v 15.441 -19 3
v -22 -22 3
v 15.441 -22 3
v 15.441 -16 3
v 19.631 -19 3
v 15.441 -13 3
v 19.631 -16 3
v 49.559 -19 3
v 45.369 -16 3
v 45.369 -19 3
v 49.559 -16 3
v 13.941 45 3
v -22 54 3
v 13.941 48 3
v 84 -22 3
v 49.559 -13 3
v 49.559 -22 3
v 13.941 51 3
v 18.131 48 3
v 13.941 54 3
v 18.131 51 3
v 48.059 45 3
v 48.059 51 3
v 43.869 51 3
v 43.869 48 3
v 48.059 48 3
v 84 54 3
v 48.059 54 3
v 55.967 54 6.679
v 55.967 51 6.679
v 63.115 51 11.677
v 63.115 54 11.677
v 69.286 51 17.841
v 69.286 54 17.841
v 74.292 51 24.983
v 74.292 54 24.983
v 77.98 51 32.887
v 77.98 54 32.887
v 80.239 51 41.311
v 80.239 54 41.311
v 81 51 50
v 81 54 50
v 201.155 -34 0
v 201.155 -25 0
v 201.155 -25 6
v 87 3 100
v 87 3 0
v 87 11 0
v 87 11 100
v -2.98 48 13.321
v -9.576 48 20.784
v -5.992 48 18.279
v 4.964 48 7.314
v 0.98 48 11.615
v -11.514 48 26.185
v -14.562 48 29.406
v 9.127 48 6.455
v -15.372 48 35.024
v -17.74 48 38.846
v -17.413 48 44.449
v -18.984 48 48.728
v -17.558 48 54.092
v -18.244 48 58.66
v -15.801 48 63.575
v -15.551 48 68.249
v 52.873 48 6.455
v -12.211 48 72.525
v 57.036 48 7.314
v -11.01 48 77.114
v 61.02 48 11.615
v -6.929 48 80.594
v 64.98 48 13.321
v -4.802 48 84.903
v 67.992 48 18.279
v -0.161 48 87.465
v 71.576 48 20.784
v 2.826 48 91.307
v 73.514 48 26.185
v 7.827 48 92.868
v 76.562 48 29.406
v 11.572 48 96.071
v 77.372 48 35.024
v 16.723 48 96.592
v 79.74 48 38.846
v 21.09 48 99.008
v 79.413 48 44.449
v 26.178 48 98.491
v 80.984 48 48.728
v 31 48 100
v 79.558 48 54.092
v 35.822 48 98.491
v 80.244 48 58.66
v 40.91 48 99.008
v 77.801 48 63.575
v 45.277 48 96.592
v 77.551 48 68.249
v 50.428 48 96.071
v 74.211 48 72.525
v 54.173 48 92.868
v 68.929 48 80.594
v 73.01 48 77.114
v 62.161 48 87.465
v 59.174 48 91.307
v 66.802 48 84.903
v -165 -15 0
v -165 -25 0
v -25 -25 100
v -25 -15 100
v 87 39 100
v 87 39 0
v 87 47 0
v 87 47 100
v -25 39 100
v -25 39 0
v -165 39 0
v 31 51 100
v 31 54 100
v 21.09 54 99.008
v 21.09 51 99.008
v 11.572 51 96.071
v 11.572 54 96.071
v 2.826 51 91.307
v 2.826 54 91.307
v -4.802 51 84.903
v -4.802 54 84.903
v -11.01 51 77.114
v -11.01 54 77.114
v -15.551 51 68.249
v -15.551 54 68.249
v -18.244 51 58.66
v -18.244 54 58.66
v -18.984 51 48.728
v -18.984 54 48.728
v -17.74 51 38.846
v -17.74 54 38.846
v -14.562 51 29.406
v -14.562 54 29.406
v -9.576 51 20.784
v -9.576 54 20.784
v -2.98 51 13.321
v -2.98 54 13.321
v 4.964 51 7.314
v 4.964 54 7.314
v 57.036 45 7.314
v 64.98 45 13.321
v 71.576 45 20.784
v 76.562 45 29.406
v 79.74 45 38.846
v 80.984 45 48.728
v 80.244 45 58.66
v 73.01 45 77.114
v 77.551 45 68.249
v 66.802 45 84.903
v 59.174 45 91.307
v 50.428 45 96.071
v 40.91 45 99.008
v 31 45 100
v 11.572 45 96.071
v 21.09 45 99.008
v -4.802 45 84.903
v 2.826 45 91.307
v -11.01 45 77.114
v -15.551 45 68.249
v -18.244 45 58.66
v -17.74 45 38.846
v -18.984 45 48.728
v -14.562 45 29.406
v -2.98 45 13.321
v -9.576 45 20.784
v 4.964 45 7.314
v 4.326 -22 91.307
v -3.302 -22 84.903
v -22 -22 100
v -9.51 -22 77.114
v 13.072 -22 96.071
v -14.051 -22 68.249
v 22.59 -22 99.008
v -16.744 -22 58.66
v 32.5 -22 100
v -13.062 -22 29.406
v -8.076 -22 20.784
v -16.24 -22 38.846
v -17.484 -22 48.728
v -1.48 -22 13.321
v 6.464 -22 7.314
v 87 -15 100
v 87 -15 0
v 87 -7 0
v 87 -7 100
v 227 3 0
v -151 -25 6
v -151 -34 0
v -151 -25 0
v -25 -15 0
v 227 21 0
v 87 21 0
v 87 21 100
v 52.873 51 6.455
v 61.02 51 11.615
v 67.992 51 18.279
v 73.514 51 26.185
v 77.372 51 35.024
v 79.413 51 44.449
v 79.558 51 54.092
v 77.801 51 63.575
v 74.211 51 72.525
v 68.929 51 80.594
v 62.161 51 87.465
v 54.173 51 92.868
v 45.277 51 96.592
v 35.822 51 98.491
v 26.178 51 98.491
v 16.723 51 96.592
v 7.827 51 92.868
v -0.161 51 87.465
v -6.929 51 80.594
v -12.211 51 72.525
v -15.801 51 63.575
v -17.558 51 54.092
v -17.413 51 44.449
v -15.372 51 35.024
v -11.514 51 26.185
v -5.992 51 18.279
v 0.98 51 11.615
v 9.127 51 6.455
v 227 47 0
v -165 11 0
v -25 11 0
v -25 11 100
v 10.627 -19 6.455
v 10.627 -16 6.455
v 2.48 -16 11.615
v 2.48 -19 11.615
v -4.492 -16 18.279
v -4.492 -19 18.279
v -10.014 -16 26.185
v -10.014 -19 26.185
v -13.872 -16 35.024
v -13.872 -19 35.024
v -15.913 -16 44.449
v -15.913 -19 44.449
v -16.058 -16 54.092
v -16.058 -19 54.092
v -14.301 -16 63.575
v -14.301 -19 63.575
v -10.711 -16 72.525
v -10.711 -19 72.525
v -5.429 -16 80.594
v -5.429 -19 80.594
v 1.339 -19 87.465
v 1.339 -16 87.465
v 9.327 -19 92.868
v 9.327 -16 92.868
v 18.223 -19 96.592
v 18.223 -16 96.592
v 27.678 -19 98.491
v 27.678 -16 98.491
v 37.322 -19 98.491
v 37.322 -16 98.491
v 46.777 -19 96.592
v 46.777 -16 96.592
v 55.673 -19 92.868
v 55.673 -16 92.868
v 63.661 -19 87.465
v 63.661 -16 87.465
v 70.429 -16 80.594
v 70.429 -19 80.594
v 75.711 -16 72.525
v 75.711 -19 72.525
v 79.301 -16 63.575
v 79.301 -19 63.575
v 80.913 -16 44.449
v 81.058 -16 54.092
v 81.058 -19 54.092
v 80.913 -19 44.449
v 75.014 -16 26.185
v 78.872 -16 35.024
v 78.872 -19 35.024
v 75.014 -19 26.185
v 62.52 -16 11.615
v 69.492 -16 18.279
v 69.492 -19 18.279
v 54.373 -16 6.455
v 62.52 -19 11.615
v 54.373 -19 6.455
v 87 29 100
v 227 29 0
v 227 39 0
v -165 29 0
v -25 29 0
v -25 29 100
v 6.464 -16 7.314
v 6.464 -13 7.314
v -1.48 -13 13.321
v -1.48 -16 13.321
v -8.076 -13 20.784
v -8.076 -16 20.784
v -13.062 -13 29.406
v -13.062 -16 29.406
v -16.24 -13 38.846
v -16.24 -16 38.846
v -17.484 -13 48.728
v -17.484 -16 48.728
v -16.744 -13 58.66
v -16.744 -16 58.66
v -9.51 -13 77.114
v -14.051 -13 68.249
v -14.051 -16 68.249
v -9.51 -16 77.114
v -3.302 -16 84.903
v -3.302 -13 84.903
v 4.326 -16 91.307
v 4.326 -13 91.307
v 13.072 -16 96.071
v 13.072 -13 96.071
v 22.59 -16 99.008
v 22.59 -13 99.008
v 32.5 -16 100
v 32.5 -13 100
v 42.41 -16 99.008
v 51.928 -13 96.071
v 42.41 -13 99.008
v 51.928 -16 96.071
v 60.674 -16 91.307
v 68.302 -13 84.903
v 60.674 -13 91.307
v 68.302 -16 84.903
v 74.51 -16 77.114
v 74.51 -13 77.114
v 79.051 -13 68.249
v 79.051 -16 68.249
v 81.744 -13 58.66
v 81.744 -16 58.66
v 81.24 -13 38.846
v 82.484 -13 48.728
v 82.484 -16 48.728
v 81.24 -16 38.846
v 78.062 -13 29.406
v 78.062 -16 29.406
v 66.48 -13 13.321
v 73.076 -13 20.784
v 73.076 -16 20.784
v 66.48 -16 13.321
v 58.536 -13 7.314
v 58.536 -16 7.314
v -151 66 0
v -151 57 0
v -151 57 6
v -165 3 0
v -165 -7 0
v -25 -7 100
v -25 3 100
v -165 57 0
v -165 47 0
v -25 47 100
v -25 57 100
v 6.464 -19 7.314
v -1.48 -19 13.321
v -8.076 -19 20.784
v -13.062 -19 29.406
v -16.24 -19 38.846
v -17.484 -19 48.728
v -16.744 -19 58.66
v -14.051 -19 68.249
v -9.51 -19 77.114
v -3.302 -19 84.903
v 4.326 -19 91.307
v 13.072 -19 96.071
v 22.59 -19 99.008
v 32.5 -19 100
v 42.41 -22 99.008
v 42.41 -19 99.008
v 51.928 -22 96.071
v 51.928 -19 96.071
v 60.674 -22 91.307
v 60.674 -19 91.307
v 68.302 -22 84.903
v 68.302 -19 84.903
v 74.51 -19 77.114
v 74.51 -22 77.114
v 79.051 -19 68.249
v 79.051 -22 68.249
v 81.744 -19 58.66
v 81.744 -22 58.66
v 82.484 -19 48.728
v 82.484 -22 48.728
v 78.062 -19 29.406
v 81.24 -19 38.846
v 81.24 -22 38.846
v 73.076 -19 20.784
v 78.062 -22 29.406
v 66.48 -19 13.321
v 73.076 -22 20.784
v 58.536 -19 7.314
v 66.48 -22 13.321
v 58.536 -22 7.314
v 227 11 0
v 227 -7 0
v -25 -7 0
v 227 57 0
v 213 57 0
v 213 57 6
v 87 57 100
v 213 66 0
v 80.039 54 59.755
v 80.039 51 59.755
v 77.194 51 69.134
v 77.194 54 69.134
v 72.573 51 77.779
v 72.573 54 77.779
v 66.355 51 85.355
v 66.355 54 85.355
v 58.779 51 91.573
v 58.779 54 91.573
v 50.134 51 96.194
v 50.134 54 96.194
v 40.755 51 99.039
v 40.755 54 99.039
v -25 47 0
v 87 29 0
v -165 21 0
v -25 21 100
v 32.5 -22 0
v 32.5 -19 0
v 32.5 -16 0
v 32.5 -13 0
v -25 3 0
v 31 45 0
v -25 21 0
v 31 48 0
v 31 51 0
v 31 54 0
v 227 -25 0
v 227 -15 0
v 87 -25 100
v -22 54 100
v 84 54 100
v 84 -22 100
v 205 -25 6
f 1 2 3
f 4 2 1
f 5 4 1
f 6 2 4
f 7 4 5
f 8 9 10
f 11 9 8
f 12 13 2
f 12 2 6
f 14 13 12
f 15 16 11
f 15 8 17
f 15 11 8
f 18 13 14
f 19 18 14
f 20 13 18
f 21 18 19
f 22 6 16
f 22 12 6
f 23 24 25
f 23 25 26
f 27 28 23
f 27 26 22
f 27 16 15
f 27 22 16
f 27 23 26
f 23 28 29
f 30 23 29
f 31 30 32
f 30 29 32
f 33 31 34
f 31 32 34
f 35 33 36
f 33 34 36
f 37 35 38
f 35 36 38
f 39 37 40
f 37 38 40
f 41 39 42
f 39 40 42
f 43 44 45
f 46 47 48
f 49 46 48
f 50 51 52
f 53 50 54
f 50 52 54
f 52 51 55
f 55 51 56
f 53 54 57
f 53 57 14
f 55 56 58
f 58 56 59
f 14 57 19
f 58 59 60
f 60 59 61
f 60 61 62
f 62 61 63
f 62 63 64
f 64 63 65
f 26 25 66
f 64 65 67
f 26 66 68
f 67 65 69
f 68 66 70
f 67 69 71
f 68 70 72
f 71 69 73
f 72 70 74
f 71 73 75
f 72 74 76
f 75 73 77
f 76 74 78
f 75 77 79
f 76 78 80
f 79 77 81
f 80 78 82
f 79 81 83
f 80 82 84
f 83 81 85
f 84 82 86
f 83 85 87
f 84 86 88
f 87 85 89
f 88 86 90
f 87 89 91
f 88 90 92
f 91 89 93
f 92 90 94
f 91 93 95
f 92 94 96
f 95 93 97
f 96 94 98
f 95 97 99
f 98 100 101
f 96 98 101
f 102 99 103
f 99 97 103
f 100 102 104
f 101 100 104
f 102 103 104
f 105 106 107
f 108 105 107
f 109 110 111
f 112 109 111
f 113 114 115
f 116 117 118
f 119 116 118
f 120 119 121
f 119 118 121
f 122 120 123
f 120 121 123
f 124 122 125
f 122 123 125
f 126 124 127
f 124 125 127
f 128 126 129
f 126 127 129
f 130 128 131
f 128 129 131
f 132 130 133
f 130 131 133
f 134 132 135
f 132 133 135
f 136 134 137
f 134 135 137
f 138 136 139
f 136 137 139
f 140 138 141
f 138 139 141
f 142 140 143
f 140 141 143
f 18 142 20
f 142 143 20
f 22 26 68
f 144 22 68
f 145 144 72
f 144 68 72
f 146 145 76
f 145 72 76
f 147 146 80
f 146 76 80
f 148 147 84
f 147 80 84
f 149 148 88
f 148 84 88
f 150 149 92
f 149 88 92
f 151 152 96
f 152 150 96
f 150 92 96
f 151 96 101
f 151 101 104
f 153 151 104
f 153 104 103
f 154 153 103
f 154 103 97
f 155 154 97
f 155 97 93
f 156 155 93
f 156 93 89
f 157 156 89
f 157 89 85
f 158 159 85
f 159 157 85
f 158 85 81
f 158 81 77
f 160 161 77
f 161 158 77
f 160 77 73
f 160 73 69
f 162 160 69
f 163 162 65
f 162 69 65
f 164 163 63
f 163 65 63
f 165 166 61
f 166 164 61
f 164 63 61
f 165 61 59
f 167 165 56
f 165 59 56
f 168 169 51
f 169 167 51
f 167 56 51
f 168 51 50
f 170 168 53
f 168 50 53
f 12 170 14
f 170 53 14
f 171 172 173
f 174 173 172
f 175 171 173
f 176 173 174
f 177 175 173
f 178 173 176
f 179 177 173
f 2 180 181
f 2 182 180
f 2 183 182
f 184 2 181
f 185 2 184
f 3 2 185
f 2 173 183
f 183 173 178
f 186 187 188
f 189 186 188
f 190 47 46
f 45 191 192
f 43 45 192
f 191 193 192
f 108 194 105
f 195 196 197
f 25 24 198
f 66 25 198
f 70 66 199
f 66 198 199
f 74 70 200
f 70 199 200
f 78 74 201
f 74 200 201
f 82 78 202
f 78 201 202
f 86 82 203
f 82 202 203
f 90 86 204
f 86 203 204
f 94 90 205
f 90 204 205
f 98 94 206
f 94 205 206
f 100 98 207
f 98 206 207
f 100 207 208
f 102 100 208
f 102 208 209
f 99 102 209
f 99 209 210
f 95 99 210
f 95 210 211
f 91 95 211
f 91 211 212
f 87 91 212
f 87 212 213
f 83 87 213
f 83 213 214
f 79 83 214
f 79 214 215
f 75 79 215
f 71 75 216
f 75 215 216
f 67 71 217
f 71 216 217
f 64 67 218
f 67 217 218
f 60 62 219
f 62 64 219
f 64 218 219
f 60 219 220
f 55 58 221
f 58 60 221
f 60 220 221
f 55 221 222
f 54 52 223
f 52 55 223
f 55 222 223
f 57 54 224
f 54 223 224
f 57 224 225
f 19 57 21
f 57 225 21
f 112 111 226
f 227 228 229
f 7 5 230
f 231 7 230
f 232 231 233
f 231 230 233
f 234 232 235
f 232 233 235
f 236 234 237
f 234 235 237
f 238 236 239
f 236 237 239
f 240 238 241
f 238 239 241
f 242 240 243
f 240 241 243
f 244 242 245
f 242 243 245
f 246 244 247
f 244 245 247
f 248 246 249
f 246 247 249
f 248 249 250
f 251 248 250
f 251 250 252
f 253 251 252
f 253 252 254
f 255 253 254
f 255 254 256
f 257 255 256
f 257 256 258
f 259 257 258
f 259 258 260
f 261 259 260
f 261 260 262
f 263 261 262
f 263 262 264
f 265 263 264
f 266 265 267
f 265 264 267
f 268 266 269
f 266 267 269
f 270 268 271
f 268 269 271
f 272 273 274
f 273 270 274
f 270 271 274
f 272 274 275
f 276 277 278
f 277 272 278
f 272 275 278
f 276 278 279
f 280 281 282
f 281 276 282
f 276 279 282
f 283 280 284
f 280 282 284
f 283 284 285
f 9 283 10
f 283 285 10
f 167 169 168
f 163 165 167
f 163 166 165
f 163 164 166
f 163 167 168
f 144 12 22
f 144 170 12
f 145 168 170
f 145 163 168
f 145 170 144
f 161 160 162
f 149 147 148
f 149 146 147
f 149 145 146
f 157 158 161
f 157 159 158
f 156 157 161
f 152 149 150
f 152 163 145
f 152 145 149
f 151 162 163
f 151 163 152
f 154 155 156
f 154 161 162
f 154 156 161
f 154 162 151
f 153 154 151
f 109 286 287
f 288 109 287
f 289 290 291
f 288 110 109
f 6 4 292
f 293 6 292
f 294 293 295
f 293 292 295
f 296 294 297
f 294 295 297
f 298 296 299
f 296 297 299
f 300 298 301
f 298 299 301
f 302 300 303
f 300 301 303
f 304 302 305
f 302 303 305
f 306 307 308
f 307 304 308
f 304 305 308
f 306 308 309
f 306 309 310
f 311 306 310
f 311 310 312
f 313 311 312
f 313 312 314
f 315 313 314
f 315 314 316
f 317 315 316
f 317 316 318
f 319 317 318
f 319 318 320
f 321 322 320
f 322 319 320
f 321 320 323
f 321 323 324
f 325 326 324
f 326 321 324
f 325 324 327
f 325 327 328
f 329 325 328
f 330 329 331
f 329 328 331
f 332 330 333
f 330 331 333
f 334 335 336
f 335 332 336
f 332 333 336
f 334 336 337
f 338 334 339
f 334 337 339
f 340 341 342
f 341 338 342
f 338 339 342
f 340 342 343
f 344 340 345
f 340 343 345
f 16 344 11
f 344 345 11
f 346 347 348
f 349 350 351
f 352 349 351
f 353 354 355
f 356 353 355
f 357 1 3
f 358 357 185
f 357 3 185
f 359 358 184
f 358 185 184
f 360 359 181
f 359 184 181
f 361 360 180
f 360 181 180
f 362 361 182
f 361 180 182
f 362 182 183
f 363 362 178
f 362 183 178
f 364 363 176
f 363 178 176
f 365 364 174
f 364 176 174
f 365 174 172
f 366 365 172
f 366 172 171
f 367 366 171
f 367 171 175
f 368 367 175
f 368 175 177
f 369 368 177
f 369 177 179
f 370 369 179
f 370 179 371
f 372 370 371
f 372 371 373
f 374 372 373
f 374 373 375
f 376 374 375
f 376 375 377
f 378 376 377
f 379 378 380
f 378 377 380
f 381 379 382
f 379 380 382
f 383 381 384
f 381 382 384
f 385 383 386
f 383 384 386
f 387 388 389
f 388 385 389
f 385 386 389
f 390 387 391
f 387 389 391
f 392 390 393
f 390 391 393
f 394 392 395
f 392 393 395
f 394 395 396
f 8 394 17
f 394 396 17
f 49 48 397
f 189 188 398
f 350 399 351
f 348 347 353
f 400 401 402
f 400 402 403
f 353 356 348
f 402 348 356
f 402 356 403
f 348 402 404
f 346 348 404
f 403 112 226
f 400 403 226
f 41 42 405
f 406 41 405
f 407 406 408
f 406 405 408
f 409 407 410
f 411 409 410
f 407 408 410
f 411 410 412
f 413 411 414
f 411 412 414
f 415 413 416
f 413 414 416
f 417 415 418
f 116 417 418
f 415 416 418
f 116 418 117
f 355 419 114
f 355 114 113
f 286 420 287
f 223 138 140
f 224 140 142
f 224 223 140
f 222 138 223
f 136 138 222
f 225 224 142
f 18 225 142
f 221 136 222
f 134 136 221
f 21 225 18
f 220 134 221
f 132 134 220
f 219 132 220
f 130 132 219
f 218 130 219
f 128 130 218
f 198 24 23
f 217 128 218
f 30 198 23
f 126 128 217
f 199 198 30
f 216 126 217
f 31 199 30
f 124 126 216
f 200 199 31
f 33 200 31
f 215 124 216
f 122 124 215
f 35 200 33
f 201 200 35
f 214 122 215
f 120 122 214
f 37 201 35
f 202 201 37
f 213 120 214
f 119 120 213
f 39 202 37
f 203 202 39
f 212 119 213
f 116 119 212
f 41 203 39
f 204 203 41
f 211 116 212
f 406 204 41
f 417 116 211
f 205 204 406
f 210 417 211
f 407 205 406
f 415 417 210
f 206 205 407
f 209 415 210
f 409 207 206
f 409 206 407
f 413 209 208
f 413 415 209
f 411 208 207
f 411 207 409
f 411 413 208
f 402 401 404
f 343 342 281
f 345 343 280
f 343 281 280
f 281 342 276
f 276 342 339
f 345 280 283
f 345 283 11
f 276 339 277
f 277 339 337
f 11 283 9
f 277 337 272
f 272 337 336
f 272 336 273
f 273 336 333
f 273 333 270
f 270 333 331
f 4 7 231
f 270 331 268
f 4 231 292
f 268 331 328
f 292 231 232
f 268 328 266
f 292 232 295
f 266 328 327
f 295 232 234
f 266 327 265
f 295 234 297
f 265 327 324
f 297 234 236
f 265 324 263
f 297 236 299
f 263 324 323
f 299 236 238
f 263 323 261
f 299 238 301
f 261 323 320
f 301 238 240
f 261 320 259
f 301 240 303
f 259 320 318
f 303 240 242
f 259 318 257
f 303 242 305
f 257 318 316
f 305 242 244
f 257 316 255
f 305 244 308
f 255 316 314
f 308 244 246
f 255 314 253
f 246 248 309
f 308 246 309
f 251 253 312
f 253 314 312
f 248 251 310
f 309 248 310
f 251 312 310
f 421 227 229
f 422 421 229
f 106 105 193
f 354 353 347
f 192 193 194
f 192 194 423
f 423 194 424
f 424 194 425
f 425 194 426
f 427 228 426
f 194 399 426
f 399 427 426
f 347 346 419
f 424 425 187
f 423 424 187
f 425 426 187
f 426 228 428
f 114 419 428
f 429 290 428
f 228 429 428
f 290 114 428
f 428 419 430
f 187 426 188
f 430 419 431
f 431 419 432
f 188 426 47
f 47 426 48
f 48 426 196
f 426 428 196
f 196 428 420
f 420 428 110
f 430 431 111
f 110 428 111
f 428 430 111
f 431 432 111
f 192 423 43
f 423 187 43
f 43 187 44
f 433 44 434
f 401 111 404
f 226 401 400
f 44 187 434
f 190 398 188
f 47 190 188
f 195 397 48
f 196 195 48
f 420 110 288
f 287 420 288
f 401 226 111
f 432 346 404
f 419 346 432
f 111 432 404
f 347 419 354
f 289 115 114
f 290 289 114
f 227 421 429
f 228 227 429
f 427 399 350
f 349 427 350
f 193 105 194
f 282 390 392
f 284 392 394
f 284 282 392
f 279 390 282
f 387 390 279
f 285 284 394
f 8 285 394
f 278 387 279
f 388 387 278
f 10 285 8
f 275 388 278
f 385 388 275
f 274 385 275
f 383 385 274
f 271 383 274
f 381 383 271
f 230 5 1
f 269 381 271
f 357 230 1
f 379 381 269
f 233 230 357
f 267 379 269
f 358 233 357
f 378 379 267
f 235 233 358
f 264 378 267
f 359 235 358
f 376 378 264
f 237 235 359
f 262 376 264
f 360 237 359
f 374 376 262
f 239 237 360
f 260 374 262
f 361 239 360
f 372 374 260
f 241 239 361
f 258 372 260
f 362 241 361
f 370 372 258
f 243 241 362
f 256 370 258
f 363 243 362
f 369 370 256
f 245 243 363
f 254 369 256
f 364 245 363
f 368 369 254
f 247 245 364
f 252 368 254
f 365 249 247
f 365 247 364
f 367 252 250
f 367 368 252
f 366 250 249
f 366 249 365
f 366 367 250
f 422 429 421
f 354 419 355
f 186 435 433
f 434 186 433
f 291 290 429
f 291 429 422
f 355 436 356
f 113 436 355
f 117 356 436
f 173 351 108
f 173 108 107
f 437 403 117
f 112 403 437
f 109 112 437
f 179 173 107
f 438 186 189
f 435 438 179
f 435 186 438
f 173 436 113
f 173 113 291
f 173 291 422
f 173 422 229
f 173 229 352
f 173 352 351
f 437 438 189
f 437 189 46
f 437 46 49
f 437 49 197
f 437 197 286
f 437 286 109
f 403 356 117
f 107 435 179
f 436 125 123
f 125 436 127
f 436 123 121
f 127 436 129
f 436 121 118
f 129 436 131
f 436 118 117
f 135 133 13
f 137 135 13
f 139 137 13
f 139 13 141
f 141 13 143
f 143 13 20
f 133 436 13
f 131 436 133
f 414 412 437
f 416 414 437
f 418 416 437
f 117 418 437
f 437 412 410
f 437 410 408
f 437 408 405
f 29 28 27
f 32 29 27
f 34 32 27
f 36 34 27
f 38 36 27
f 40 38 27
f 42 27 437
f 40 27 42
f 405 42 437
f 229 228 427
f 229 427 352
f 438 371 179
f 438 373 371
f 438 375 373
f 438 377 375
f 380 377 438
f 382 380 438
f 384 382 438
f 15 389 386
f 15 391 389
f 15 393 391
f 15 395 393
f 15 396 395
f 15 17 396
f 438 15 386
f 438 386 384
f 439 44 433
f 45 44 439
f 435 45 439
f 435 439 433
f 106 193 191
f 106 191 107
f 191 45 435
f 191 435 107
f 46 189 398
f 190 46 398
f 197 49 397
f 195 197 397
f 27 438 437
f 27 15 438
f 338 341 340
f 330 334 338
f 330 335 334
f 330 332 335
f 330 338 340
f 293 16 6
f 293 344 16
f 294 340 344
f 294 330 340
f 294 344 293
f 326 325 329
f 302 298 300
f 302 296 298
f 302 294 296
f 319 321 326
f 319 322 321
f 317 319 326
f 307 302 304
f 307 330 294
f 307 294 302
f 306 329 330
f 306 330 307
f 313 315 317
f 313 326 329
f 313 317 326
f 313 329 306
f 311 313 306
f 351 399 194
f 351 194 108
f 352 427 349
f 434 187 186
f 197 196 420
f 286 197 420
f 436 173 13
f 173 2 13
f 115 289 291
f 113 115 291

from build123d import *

# Parameters (mm, degrees)
F0_W      = 112
F0_H      = 82
F1_DEPTH  = 100
F2_T      = -3
F3_W      = 10
F3_H      = 100
F4_DEPTH  = 140
F6_DEPTH  = 100
F7_W      = 226.154828
F7_H      = 6
F8_DEPTH  = 9
F11_DEPTH = 3
F12_R     = 48.73
F13_DEPTH = 3
F14_R     = 50
F15_DEPTH = 3
F16_W     = 10
F16_H     = 100
F17_DEPTH = 140
F19_DEPTH = 82
F21_DEPTH = 3
F22_R     = 48.73
F23_DEPTH = 3
F24_R     = 50
F25_DEPTH = 3
F26_W     = 126
F26_H     = 6
F27_DEPTH = 9
F29_W     = 364
F29_H     = 6
F30_DEPTH = 9
F32_DEPTH = 372
F33_DEPTH = 356


with BuildPart() as f1:
    # F0 (on Top) → F1 (new body)
    with BuildSketch(Plane.XY):
        with Locations((31, 16)):
            Rectangle(F0_W, F0_H)
    extrude(amount=F1_DEPTH)

    # F2
    f2_openings = [f1.faces().sort_by_distance(p)[0] for p in [
        (31, 16, 100),
    ]]
    offset(amount=F2_T, openings=f2_openings)

    # F3 (on face) → F4 (join)
    with BuildSketch(Plane.YZ.offset(87)):
        with Locations((-20, 50)):
            Rectangle(F3_W, F3_H)
        with Locations((52, 50)):
            Rectangle(F3_W, F3_H)
        with Locations((34, 50)):
            Rectangle(F3_W, F3_H)
        with Locations((16, 50)):
            Rectangle(F3_W, F3_H)
        with Locations((-2, 50)):
            Rectangle(F3_W, F3_H)
    extrude(amount=F4_DEPTH)

    # F5 (on face) → F6 (cut)
    with BuildSketch(Plane.XZ.offset(25)):
        Polygon((227, 0), (227, 100), (87, 100), align=None)
    extrude(amount=-F6_DEPTH, mode=Mode.SUBTRACT)

    # F7 (on face) → F8 (join)
    with BuildSketch(Plane.XZ.offset(25)):
        with Locations((88.077414, 3)):
            Rectangle(F7_W, F7_H)
    extrude(amount=F8_DEPTH)

    # F10 (on face) → F11 (join)
    with BuildSketch(Plane.XZ.offset(-54)):
        with BuildLine():
            ThreePointArc((81, 50), (66.355339, 85.355339), (31, 100))
            Line((31, 100), (31, 0))
            ThreePointArc((31, 0), (66.355339, 14.644661), (81, 50))
        make_face()
        with BuildLine():
            Line((31, 0), (31, 100))
            ThreePointArc((31, 100), (-19, 50), (31, 0))
        make_face()
    extrude(amount=F11_DEPTH)

    # F12 (on face) → F13 (join)
    with BuildSketch(Plane.XZ.offset(-51)):
        with Locations((31, 50)):
            Circle(F12_R)
    extrude(amount=F13_DEPTH)

    # F14 (on face) → F15 (join)
    with BuildSketch(Plane.XZ.offset(-48)):
        with Locations((31, 50)):
            Circle(F14_R)
    extrude(amount=F15_DEPTH)

    # F16 (on face) → F17 (join)
    with BuildSketch(Plane(origin=(-25, 0, 0), x_dir=(0, -1, 0), z_dir=(-1, 0, 0))):
        with Locations((-52, 50)):
            Rectangle(F16_W, F16_H)
        with Locations((-34, 50)):
            Rectangle(F16_W, F16_H)
        with Locations((-16, 50)):
            Rectangle(F16_W, F16_H)
        with Locations((2, 50)):
            Rectangle(F16_W, F16_H)
        with Locations((20, 50)):
            Rectangle(F16_W, F16_H)
    extrude(amount=F17_DEPTH)

    # F18 (on face) → F19 (cut)
    with BuildSketch(Plane.XZ.offset(25)):
        Polygon((-165, 100), (-165, 0), (-25, 100), align=None)
    extrude(amount=-F19_DEPTH, mode=Mode.SUBTRACT)

    # F20 (on face) → F21 (join)
    with BuildSketch(Plane(origin=(0, -22, 0), x_dir=(-1, 0, 0), z_dir=(0, 1, 0))):
        with BuildLine():
            Line((-82.5, 50), (17.5, 50))
            ThreePointArc((17.5, 50), (-32.5, 100), (-82.5, 50))
        make_face()
        with BuildLine():
            ThreePointArc((-82.5, 50), (-32.5, 0), (17.5, 50))
            Line((17.5, 50), (-82.5, 50))
        make_face()
    extrude(amount=F21_DEPTH)

    # F22 (on face) → F23 (join)
    with BuildSketch(Plane(origin=(0, -19, 0), x_dir=(-1, 0, 0), z_dir=(0, 1, 0))):
        with Locations((-32.5, 50)):
            Circle(F22_R)
    extrude(amount=F23_DEPTH)

    # F24 (on face) → F25 (join)
    with BuildSketch(Plane(origin=(0, -16, 0), x_dir=(-1, 0, 0), z_dir=(0, 1, 0))):
        with Locations((-32.5, 50)):
            Circle(F24_R)
    extrude(amount=F25_DEPTH)

    # F26 (on face) → F27 (join)
    with BuildSketch(Plane.XZ.offset(25)):
        with Locations((-88, 3)):
            Rectangle(F26_W, F26_H)
    extrude(amount=F27_DEPTH)

    # F29 (on face) → F30 (join)
    with BuildSketch(Plane(origin=(0, 57, 0), x_dir=(-1, 0, 0), z_dir=(0, 1, 0))):
        with Locations((-31, 3)):
            Rectangle(F29_W, F29_H)
    extrude(amount=F30_DEPTH)

    # F31 (on face) → F32 (cut)
    with BuildSketch(Plane.YZ.offset(213)):
        Polygon((66, 6), (57, 6), (66, 0), align=None)
    extrude(amount=-F32_DEPTH, mode=Mode.SUBTRACT)

    # F28 (on face) → F33 (cut)
    with BuildSketch(Plane(origin=(-151, 0, 0), x_dir=(0, -1, 0), z_dir=(-1, 0, 0))):
        Polygon((34, 6), (25, 6), (34, 0), align=None)
    extrude(amount=-F33_DEPTH, mode=Mode.SUBTRACT)


solid = f1.part
